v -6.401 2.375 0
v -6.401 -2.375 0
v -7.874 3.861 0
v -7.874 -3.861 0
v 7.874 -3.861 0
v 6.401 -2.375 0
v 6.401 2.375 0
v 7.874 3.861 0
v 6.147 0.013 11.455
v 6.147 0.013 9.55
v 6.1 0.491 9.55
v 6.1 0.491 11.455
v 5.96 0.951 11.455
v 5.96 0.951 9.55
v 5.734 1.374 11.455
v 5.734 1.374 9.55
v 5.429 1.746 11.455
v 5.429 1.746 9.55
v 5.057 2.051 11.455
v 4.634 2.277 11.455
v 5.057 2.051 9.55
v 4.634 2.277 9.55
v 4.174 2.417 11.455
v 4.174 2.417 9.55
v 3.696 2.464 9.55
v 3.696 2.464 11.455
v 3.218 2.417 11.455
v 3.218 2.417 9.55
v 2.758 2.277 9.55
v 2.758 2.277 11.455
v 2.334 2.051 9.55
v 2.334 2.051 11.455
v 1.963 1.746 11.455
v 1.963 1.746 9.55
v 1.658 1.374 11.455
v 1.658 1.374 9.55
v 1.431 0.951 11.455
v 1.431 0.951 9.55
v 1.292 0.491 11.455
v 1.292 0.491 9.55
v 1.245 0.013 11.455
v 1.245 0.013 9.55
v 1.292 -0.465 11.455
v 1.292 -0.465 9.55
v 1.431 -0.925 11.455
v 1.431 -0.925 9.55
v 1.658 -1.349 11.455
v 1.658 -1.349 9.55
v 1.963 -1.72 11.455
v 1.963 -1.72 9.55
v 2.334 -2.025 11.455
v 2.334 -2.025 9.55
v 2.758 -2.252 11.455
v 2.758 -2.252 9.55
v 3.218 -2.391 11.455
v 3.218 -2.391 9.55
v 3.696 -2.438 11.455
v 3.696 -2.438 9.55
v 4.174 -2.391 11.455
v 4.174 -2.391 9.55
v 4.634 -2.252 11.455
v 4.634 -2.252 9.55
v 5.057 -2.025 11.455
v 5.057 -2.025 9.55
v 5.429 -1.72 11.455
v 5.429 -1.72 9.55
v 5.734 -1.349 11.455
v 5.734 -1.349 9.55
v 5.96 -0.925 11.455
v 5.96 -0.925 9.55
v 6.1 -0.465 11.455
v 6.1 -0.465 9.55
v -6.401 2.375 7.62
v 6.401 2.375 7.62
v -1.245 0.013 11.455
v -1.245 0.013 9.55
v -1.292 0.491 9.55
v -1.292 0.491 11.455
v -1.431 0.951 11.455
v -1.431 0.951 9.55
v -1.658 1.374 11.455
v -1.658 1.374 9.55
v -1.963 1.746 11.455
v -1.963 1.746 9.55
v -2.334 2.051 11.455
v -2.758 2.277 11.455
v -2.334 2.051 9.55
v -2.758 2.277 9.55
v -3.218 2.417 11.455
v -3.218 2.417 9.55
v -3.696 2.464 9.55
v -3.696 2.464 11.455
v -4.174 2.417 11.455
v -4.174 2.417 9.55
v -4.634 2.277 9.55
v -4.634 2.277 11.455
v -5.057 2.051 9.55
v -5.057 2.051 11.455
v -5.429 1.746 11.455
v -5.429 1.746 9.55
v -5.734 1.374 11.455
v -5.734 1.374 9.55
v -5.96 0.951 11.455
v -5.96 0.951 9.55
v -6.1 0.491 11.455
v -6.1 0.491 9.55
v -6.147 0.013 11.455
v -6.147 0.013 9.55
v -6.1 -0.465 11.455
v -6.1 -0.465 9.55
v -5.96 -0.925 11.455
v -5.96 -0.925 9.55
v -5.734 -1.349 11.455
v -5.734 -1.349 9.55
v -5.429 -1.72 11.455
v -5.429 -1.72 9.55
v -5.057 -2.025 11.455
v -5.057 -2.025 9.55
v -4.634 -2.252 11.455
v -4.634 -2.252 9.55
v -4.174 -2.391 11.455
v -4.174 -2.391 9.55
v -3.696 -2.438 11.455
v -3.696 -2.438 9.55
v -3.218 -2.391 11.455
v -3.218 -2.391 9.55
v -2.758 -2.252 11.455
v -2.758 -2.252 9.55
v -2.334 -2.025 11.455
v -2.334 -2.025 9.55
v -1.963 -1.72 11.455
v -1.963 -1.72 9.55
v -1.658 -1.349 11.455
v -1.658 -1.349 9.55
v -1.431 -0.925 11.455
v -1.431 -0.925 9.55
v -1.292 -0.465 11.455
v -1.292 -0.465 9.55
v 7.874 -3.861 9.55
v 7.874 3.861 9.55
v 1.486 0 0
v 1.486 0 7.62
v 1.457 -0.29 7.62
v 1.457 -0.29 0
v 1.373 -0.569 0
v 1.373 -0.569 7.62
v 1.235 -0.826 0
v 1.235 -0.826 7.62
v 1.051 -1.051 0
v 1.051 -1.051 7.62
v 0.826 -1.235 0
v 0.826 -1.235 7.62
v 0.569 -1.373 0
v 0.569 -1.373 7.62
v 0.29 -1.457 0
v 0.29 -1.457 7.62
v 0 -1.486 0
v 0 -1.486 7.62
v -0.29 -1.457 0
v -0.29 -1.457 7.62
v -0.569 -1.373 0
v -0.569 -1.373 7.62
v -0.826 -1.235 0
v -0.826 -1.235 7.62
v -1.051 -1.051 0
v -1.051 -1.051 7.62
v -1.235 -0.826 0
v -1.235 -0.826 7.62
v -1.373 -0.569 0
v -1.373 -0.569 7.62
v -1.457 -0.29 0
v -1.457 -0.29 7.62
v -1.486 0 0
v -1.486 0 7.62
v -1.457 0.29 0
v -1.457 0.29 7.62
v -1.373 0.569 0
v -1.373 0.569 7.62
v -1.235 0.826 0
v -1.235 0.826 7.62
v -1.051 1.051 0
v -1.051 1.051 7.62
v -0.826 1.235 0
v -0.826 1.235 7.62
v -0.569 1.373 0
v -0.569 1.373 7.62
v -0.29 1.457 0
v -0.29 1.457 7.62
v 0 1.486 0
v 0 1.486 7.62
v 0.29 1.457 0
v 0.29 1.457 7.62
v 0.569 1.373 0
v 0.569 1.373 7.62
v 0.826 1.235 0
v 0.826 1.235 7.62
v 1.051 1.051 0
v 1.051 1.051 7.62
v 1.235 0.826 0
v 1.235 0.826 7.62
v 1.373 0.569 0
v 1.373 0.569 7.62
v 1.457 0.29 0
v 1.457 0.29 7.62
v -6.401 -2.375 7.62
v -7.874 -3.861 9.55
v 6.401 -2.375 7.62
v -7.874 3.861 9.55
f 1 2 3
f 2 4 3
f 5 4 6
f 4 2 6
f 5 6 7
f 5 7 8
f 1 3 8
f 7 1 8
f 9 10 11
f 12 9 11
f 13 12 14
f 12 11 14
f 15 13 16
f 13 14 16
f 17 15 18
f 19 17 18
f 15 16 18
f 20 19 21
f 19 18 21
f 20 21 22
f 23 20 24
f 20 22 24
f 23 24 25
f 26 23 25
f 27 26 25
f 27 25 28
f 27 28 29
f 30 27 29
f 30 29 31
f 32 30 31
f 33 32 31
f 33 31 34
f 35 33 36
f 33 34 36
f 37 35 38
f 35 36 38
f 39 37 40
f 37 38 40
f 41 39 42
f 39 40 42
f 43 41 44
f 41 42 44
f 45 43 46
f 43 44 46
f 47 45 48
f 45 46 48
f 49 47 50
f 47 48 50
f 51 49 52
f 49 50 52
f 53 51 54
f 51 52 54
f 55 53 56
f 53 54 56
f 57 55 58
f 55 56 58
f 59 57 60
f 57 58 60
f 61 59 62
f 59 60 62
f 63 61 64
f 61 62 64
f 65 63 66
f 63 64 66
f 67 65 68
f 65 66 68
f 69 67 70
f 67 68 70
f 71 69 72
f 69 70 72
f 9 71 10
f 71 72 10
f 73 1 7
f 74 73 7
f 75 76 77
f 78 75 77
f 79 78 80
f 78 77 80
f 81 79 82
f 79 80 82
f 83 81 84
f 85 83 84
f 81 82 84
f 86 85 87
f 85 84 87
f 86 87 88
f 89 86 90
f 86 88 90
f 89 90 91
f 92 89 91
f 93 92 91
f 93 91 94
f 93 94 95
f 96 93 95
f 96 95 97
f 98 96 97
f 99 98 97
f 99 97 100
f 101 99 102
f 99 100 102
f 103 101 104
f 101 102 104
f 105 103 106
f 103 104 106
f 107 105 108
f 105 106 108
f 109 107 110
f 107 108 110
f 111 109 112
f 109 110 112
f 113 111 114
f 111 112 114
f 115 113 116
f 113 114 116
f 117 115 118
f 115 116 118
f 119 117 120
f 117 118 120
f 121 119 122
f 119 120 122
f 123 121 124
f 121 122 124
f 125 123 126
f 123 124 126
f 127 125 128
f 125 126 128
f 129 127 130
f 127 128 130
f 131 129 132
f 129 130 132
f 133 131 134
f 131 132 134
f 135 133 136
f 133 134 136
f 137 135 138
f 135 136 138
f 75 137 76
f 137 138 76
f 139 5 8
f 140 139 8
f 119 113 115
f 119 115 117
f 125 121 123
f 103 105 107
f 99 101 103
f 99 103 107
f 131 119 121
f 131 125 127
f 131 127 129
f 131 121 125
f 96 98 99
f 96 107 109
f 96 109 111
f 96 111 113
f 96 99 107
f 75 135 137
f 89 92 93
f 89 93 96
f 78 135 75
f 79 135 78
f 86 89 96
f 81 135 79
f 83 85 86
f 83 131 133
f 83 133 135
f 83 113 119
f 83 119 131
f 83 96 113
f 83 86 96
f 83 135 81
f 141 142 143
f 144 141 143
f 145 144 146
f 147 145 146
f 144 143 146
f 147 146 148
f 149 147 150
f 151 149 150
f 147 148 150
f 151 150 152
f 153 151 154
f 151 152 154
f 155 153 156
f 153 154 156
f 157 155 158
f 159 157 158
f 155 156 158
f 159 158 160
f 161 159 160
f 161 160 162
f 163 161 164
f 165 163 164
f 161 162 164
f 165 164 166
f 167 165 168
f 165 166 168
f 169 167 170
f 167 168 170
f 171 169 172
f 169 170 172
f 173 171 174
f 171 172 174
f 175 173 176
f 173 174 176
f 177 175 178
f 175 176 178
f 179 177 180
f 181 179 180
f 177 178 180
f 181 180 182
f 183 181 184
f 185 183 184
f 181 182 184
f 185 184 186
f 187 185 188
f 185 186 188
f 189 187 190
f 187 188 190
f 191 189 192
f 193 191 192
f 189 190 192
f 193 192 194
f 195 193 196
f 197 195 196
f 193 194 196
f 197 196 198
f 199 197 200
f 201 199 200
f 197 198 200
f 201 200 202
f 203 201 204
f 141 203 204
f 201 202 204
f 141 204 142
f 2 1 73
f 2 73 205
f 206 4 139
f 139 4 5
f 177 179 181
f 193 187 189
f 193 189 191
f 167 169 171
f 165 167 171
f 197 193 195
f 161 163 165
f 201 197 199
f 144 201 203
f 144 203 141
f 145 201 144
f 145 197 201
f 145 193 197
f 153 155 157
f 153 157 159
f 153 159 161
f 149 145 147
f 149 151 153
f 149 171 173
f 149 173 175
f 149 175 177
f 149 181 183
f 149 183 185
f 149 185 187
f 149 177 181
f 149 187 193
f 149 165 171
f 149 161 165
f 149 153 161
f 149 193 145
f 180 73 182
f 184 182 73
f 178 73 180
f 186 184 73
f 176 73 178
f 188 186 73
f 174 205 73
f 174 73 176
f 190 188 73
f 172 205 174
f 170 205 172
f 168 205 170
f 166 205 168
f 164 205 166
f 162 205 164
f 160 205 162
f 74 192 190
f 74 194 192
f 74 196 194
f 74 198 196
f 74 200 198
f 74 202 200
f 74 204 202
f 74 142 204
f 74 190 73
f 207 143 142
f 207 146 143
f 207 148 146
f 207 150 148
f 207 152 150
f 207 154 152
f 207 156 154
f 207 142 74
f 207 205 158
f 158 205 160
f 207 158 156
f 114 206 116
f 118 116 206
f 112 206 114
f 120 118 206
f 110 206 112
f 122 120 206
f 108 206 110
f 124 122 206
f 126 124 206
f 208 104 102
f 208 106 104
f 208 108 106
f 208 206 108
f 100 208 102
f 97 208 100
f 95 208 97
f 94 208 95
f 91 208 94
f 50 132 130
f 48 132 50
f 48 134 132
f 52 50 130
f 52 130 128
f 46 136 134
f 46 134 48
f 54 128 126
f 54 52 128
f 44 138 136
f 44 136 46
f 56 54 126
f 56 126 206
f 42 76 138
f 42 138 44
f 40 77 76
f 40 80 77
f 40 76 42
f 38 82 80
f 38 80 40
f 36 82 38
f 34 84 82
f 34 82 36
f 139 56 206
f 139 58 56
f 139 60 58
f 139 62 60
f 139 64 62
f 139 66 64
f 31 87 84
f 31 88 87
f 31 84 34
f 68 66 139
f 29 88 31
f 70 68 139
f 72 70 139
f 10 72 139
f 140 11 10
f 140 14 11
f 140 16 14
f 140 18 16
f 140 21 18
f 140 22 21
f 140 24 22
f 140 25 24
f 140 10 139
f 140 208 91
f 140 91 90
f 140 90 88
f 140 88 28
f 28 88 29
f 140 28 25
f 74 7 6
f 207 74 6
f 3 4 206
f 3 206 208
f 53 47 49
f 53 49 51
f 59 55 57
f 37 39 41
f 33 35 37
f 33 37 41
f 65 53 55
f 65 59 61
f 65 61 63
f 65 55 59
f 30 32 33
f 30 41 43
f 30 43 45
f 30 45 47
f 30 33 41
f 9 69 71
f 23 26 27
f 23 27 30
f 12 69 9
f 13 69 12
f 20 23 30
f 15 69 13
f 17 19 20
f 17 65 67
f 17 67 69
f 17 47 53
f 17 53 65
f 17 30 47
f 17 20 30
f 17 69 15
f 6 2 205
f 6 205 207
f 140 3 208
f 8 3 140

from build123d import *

# Parameters (mm, degrees)
F0_W     = 15.748
F0_H     = 7.7216
F1_DEPTH = 9.5504
F2_R     = 2.4511
F3_DEPTH = 1.905
F4_R     = 2.4511
F5_DEPTH = 1.905
F6_W     = 12.8016
F6_H     = 4.7498
F7_DEPTH = 7.62
F8_R     = 1.4859
F9_DEPTH = 7.62


with BuildPart() as f1:
    # F0 (on Top) → F1 (new body)
    with BuildSketch(Plane.XY):
        Rectangle(F0_W, F0_H)
    extrude(amount=F1_DEPTH)

    # F2 (on face) → F3 (join)
    with BuildSketch(Plane.XY.offset(9.5504)):
        with Locations((-3.6957, 0.0127)):
            Circle(F2_R)
    extrude(amount=F3_DEPTH)

    # F4 (on face) → F5 (join)
    with BuildSketch(Plane.XY.offset(9.5504)):
        with Locations((3.6957, 0.0127)):
            Circle(F4_R)
    extrude(amount=F5_DEPTH)

    # F6 (on face) → F7 (cut)
    with BuildSketch(Plane(origin=(0, 0, 0), x_dir=(1, 0, 0), z_dir=(0, 0, -1))):
        Rectangle(F6_W, F6_H)
    extrude(amount=-F7_DEPTH, mode=Mode.SUBTRACT)

    # F8 (on face) → F9 (join)
    with BuildSketch(Plane(origin=(0, 0, 7.62), x_dir=(1, 0, 0), z_dir=(0, 0, -1))):
        Circle(F8_R)
    extrude(amount=F9_DEPTH)


solid = f1.part
